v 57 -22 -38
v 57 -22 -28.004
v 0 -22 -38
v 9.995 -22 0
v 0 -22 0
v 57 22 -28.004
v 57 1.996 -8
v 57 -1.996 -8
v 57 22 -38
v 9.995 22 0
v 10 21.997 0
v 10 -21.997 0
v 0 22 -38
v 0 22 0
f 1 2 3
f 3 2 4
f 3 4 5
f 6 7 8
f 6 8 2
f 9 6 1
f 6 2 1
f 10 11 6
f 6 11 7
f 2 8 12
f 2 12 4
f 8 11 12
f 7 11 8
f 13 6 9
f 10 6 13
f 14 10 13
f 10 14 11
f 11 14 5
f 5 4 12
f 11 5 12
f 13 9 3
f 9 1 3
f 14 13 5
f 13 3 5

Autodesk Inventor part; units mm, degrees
ref_plane "YZ Plane" through (0, 0, 0) normal (1, 0, 0) x (0, 1, 0)
ref_plane "XZ Plane" through (0, 0, 0) normal (0, 1, 0) x (-1, 0, 0)
sketch "草圖1" plane through (0, 0, 0) normal (0, 1, 0) x (-1, 0, 0)
  line L0 (0, 0) -> (-57, 0)
  line L1 (-57, 0) -> (-57, -38)
  line L2 (-57, -38) -> (0, -38)
  line L3 (0, -38) -> (0, 0)
  dimension "d0" = 57
  dimension "d1" = 38
extrude "擠出1" add sketch "草圖1" along normal mid plane 44
sketch "草圖2" plane through (0, 22, 0) normal (0, 1, 0) x (1, 0, 0)
  line L0 (0, 0) -> (57, 0) projected
  line L1 (10, 0) -> (57, 8)
  line L2 (57, 0) -> (57, 38) projected
  dimension "d4" = 10
  dimension "d5" = 30
extrude "擠出2" cut sketch "草圖2" against normal blind 60
sketch "草圖3" plane through (57, -22, -38) normal (1, 0, 0) x (0, 0, -1)
  line L0 (-30, 24) -> (-10, 44)
  line L1 (0, 44) -> (-38, 44) projected
  line L2 (-30, 44) -> (-30, 0) projected
  point P0 (-38, 22)
  point P1 (-30, 2)
  dimension "d8" = 20
  dimension "d9" = 20
ref_plane "工作平面1" through (10, 22, 0) normal (-0.3882, -0.6516, -0.6516) x (0.8591, 0, -0.5118)
sketch "草圖4" plane through (10, 22, 0) normal (-0.3882, -0.6516, -0.6516) x (0.8591, 0, -0.5118)
  line L0 (-15.1543, -12.3218) -> (93.717, -12.3218)
  line L1 (93.717, -12.3218) -> (93.717, 28.8166)
  line L2 (93.717, 28.8166) -> (-15.1543, 28.8166)
  line L3 (-15.1543, 28.8166) -> (-15.1543, -12.3218)
  point P0 (-8.591, 13.3523)
extrude "擠出3" cut sketch "草圖4" against normal blind 40
mirror "鏡射1" about plane through (0, 0, 0) normal (0, 1, 0) of "擠出3"
properties part number "52"
